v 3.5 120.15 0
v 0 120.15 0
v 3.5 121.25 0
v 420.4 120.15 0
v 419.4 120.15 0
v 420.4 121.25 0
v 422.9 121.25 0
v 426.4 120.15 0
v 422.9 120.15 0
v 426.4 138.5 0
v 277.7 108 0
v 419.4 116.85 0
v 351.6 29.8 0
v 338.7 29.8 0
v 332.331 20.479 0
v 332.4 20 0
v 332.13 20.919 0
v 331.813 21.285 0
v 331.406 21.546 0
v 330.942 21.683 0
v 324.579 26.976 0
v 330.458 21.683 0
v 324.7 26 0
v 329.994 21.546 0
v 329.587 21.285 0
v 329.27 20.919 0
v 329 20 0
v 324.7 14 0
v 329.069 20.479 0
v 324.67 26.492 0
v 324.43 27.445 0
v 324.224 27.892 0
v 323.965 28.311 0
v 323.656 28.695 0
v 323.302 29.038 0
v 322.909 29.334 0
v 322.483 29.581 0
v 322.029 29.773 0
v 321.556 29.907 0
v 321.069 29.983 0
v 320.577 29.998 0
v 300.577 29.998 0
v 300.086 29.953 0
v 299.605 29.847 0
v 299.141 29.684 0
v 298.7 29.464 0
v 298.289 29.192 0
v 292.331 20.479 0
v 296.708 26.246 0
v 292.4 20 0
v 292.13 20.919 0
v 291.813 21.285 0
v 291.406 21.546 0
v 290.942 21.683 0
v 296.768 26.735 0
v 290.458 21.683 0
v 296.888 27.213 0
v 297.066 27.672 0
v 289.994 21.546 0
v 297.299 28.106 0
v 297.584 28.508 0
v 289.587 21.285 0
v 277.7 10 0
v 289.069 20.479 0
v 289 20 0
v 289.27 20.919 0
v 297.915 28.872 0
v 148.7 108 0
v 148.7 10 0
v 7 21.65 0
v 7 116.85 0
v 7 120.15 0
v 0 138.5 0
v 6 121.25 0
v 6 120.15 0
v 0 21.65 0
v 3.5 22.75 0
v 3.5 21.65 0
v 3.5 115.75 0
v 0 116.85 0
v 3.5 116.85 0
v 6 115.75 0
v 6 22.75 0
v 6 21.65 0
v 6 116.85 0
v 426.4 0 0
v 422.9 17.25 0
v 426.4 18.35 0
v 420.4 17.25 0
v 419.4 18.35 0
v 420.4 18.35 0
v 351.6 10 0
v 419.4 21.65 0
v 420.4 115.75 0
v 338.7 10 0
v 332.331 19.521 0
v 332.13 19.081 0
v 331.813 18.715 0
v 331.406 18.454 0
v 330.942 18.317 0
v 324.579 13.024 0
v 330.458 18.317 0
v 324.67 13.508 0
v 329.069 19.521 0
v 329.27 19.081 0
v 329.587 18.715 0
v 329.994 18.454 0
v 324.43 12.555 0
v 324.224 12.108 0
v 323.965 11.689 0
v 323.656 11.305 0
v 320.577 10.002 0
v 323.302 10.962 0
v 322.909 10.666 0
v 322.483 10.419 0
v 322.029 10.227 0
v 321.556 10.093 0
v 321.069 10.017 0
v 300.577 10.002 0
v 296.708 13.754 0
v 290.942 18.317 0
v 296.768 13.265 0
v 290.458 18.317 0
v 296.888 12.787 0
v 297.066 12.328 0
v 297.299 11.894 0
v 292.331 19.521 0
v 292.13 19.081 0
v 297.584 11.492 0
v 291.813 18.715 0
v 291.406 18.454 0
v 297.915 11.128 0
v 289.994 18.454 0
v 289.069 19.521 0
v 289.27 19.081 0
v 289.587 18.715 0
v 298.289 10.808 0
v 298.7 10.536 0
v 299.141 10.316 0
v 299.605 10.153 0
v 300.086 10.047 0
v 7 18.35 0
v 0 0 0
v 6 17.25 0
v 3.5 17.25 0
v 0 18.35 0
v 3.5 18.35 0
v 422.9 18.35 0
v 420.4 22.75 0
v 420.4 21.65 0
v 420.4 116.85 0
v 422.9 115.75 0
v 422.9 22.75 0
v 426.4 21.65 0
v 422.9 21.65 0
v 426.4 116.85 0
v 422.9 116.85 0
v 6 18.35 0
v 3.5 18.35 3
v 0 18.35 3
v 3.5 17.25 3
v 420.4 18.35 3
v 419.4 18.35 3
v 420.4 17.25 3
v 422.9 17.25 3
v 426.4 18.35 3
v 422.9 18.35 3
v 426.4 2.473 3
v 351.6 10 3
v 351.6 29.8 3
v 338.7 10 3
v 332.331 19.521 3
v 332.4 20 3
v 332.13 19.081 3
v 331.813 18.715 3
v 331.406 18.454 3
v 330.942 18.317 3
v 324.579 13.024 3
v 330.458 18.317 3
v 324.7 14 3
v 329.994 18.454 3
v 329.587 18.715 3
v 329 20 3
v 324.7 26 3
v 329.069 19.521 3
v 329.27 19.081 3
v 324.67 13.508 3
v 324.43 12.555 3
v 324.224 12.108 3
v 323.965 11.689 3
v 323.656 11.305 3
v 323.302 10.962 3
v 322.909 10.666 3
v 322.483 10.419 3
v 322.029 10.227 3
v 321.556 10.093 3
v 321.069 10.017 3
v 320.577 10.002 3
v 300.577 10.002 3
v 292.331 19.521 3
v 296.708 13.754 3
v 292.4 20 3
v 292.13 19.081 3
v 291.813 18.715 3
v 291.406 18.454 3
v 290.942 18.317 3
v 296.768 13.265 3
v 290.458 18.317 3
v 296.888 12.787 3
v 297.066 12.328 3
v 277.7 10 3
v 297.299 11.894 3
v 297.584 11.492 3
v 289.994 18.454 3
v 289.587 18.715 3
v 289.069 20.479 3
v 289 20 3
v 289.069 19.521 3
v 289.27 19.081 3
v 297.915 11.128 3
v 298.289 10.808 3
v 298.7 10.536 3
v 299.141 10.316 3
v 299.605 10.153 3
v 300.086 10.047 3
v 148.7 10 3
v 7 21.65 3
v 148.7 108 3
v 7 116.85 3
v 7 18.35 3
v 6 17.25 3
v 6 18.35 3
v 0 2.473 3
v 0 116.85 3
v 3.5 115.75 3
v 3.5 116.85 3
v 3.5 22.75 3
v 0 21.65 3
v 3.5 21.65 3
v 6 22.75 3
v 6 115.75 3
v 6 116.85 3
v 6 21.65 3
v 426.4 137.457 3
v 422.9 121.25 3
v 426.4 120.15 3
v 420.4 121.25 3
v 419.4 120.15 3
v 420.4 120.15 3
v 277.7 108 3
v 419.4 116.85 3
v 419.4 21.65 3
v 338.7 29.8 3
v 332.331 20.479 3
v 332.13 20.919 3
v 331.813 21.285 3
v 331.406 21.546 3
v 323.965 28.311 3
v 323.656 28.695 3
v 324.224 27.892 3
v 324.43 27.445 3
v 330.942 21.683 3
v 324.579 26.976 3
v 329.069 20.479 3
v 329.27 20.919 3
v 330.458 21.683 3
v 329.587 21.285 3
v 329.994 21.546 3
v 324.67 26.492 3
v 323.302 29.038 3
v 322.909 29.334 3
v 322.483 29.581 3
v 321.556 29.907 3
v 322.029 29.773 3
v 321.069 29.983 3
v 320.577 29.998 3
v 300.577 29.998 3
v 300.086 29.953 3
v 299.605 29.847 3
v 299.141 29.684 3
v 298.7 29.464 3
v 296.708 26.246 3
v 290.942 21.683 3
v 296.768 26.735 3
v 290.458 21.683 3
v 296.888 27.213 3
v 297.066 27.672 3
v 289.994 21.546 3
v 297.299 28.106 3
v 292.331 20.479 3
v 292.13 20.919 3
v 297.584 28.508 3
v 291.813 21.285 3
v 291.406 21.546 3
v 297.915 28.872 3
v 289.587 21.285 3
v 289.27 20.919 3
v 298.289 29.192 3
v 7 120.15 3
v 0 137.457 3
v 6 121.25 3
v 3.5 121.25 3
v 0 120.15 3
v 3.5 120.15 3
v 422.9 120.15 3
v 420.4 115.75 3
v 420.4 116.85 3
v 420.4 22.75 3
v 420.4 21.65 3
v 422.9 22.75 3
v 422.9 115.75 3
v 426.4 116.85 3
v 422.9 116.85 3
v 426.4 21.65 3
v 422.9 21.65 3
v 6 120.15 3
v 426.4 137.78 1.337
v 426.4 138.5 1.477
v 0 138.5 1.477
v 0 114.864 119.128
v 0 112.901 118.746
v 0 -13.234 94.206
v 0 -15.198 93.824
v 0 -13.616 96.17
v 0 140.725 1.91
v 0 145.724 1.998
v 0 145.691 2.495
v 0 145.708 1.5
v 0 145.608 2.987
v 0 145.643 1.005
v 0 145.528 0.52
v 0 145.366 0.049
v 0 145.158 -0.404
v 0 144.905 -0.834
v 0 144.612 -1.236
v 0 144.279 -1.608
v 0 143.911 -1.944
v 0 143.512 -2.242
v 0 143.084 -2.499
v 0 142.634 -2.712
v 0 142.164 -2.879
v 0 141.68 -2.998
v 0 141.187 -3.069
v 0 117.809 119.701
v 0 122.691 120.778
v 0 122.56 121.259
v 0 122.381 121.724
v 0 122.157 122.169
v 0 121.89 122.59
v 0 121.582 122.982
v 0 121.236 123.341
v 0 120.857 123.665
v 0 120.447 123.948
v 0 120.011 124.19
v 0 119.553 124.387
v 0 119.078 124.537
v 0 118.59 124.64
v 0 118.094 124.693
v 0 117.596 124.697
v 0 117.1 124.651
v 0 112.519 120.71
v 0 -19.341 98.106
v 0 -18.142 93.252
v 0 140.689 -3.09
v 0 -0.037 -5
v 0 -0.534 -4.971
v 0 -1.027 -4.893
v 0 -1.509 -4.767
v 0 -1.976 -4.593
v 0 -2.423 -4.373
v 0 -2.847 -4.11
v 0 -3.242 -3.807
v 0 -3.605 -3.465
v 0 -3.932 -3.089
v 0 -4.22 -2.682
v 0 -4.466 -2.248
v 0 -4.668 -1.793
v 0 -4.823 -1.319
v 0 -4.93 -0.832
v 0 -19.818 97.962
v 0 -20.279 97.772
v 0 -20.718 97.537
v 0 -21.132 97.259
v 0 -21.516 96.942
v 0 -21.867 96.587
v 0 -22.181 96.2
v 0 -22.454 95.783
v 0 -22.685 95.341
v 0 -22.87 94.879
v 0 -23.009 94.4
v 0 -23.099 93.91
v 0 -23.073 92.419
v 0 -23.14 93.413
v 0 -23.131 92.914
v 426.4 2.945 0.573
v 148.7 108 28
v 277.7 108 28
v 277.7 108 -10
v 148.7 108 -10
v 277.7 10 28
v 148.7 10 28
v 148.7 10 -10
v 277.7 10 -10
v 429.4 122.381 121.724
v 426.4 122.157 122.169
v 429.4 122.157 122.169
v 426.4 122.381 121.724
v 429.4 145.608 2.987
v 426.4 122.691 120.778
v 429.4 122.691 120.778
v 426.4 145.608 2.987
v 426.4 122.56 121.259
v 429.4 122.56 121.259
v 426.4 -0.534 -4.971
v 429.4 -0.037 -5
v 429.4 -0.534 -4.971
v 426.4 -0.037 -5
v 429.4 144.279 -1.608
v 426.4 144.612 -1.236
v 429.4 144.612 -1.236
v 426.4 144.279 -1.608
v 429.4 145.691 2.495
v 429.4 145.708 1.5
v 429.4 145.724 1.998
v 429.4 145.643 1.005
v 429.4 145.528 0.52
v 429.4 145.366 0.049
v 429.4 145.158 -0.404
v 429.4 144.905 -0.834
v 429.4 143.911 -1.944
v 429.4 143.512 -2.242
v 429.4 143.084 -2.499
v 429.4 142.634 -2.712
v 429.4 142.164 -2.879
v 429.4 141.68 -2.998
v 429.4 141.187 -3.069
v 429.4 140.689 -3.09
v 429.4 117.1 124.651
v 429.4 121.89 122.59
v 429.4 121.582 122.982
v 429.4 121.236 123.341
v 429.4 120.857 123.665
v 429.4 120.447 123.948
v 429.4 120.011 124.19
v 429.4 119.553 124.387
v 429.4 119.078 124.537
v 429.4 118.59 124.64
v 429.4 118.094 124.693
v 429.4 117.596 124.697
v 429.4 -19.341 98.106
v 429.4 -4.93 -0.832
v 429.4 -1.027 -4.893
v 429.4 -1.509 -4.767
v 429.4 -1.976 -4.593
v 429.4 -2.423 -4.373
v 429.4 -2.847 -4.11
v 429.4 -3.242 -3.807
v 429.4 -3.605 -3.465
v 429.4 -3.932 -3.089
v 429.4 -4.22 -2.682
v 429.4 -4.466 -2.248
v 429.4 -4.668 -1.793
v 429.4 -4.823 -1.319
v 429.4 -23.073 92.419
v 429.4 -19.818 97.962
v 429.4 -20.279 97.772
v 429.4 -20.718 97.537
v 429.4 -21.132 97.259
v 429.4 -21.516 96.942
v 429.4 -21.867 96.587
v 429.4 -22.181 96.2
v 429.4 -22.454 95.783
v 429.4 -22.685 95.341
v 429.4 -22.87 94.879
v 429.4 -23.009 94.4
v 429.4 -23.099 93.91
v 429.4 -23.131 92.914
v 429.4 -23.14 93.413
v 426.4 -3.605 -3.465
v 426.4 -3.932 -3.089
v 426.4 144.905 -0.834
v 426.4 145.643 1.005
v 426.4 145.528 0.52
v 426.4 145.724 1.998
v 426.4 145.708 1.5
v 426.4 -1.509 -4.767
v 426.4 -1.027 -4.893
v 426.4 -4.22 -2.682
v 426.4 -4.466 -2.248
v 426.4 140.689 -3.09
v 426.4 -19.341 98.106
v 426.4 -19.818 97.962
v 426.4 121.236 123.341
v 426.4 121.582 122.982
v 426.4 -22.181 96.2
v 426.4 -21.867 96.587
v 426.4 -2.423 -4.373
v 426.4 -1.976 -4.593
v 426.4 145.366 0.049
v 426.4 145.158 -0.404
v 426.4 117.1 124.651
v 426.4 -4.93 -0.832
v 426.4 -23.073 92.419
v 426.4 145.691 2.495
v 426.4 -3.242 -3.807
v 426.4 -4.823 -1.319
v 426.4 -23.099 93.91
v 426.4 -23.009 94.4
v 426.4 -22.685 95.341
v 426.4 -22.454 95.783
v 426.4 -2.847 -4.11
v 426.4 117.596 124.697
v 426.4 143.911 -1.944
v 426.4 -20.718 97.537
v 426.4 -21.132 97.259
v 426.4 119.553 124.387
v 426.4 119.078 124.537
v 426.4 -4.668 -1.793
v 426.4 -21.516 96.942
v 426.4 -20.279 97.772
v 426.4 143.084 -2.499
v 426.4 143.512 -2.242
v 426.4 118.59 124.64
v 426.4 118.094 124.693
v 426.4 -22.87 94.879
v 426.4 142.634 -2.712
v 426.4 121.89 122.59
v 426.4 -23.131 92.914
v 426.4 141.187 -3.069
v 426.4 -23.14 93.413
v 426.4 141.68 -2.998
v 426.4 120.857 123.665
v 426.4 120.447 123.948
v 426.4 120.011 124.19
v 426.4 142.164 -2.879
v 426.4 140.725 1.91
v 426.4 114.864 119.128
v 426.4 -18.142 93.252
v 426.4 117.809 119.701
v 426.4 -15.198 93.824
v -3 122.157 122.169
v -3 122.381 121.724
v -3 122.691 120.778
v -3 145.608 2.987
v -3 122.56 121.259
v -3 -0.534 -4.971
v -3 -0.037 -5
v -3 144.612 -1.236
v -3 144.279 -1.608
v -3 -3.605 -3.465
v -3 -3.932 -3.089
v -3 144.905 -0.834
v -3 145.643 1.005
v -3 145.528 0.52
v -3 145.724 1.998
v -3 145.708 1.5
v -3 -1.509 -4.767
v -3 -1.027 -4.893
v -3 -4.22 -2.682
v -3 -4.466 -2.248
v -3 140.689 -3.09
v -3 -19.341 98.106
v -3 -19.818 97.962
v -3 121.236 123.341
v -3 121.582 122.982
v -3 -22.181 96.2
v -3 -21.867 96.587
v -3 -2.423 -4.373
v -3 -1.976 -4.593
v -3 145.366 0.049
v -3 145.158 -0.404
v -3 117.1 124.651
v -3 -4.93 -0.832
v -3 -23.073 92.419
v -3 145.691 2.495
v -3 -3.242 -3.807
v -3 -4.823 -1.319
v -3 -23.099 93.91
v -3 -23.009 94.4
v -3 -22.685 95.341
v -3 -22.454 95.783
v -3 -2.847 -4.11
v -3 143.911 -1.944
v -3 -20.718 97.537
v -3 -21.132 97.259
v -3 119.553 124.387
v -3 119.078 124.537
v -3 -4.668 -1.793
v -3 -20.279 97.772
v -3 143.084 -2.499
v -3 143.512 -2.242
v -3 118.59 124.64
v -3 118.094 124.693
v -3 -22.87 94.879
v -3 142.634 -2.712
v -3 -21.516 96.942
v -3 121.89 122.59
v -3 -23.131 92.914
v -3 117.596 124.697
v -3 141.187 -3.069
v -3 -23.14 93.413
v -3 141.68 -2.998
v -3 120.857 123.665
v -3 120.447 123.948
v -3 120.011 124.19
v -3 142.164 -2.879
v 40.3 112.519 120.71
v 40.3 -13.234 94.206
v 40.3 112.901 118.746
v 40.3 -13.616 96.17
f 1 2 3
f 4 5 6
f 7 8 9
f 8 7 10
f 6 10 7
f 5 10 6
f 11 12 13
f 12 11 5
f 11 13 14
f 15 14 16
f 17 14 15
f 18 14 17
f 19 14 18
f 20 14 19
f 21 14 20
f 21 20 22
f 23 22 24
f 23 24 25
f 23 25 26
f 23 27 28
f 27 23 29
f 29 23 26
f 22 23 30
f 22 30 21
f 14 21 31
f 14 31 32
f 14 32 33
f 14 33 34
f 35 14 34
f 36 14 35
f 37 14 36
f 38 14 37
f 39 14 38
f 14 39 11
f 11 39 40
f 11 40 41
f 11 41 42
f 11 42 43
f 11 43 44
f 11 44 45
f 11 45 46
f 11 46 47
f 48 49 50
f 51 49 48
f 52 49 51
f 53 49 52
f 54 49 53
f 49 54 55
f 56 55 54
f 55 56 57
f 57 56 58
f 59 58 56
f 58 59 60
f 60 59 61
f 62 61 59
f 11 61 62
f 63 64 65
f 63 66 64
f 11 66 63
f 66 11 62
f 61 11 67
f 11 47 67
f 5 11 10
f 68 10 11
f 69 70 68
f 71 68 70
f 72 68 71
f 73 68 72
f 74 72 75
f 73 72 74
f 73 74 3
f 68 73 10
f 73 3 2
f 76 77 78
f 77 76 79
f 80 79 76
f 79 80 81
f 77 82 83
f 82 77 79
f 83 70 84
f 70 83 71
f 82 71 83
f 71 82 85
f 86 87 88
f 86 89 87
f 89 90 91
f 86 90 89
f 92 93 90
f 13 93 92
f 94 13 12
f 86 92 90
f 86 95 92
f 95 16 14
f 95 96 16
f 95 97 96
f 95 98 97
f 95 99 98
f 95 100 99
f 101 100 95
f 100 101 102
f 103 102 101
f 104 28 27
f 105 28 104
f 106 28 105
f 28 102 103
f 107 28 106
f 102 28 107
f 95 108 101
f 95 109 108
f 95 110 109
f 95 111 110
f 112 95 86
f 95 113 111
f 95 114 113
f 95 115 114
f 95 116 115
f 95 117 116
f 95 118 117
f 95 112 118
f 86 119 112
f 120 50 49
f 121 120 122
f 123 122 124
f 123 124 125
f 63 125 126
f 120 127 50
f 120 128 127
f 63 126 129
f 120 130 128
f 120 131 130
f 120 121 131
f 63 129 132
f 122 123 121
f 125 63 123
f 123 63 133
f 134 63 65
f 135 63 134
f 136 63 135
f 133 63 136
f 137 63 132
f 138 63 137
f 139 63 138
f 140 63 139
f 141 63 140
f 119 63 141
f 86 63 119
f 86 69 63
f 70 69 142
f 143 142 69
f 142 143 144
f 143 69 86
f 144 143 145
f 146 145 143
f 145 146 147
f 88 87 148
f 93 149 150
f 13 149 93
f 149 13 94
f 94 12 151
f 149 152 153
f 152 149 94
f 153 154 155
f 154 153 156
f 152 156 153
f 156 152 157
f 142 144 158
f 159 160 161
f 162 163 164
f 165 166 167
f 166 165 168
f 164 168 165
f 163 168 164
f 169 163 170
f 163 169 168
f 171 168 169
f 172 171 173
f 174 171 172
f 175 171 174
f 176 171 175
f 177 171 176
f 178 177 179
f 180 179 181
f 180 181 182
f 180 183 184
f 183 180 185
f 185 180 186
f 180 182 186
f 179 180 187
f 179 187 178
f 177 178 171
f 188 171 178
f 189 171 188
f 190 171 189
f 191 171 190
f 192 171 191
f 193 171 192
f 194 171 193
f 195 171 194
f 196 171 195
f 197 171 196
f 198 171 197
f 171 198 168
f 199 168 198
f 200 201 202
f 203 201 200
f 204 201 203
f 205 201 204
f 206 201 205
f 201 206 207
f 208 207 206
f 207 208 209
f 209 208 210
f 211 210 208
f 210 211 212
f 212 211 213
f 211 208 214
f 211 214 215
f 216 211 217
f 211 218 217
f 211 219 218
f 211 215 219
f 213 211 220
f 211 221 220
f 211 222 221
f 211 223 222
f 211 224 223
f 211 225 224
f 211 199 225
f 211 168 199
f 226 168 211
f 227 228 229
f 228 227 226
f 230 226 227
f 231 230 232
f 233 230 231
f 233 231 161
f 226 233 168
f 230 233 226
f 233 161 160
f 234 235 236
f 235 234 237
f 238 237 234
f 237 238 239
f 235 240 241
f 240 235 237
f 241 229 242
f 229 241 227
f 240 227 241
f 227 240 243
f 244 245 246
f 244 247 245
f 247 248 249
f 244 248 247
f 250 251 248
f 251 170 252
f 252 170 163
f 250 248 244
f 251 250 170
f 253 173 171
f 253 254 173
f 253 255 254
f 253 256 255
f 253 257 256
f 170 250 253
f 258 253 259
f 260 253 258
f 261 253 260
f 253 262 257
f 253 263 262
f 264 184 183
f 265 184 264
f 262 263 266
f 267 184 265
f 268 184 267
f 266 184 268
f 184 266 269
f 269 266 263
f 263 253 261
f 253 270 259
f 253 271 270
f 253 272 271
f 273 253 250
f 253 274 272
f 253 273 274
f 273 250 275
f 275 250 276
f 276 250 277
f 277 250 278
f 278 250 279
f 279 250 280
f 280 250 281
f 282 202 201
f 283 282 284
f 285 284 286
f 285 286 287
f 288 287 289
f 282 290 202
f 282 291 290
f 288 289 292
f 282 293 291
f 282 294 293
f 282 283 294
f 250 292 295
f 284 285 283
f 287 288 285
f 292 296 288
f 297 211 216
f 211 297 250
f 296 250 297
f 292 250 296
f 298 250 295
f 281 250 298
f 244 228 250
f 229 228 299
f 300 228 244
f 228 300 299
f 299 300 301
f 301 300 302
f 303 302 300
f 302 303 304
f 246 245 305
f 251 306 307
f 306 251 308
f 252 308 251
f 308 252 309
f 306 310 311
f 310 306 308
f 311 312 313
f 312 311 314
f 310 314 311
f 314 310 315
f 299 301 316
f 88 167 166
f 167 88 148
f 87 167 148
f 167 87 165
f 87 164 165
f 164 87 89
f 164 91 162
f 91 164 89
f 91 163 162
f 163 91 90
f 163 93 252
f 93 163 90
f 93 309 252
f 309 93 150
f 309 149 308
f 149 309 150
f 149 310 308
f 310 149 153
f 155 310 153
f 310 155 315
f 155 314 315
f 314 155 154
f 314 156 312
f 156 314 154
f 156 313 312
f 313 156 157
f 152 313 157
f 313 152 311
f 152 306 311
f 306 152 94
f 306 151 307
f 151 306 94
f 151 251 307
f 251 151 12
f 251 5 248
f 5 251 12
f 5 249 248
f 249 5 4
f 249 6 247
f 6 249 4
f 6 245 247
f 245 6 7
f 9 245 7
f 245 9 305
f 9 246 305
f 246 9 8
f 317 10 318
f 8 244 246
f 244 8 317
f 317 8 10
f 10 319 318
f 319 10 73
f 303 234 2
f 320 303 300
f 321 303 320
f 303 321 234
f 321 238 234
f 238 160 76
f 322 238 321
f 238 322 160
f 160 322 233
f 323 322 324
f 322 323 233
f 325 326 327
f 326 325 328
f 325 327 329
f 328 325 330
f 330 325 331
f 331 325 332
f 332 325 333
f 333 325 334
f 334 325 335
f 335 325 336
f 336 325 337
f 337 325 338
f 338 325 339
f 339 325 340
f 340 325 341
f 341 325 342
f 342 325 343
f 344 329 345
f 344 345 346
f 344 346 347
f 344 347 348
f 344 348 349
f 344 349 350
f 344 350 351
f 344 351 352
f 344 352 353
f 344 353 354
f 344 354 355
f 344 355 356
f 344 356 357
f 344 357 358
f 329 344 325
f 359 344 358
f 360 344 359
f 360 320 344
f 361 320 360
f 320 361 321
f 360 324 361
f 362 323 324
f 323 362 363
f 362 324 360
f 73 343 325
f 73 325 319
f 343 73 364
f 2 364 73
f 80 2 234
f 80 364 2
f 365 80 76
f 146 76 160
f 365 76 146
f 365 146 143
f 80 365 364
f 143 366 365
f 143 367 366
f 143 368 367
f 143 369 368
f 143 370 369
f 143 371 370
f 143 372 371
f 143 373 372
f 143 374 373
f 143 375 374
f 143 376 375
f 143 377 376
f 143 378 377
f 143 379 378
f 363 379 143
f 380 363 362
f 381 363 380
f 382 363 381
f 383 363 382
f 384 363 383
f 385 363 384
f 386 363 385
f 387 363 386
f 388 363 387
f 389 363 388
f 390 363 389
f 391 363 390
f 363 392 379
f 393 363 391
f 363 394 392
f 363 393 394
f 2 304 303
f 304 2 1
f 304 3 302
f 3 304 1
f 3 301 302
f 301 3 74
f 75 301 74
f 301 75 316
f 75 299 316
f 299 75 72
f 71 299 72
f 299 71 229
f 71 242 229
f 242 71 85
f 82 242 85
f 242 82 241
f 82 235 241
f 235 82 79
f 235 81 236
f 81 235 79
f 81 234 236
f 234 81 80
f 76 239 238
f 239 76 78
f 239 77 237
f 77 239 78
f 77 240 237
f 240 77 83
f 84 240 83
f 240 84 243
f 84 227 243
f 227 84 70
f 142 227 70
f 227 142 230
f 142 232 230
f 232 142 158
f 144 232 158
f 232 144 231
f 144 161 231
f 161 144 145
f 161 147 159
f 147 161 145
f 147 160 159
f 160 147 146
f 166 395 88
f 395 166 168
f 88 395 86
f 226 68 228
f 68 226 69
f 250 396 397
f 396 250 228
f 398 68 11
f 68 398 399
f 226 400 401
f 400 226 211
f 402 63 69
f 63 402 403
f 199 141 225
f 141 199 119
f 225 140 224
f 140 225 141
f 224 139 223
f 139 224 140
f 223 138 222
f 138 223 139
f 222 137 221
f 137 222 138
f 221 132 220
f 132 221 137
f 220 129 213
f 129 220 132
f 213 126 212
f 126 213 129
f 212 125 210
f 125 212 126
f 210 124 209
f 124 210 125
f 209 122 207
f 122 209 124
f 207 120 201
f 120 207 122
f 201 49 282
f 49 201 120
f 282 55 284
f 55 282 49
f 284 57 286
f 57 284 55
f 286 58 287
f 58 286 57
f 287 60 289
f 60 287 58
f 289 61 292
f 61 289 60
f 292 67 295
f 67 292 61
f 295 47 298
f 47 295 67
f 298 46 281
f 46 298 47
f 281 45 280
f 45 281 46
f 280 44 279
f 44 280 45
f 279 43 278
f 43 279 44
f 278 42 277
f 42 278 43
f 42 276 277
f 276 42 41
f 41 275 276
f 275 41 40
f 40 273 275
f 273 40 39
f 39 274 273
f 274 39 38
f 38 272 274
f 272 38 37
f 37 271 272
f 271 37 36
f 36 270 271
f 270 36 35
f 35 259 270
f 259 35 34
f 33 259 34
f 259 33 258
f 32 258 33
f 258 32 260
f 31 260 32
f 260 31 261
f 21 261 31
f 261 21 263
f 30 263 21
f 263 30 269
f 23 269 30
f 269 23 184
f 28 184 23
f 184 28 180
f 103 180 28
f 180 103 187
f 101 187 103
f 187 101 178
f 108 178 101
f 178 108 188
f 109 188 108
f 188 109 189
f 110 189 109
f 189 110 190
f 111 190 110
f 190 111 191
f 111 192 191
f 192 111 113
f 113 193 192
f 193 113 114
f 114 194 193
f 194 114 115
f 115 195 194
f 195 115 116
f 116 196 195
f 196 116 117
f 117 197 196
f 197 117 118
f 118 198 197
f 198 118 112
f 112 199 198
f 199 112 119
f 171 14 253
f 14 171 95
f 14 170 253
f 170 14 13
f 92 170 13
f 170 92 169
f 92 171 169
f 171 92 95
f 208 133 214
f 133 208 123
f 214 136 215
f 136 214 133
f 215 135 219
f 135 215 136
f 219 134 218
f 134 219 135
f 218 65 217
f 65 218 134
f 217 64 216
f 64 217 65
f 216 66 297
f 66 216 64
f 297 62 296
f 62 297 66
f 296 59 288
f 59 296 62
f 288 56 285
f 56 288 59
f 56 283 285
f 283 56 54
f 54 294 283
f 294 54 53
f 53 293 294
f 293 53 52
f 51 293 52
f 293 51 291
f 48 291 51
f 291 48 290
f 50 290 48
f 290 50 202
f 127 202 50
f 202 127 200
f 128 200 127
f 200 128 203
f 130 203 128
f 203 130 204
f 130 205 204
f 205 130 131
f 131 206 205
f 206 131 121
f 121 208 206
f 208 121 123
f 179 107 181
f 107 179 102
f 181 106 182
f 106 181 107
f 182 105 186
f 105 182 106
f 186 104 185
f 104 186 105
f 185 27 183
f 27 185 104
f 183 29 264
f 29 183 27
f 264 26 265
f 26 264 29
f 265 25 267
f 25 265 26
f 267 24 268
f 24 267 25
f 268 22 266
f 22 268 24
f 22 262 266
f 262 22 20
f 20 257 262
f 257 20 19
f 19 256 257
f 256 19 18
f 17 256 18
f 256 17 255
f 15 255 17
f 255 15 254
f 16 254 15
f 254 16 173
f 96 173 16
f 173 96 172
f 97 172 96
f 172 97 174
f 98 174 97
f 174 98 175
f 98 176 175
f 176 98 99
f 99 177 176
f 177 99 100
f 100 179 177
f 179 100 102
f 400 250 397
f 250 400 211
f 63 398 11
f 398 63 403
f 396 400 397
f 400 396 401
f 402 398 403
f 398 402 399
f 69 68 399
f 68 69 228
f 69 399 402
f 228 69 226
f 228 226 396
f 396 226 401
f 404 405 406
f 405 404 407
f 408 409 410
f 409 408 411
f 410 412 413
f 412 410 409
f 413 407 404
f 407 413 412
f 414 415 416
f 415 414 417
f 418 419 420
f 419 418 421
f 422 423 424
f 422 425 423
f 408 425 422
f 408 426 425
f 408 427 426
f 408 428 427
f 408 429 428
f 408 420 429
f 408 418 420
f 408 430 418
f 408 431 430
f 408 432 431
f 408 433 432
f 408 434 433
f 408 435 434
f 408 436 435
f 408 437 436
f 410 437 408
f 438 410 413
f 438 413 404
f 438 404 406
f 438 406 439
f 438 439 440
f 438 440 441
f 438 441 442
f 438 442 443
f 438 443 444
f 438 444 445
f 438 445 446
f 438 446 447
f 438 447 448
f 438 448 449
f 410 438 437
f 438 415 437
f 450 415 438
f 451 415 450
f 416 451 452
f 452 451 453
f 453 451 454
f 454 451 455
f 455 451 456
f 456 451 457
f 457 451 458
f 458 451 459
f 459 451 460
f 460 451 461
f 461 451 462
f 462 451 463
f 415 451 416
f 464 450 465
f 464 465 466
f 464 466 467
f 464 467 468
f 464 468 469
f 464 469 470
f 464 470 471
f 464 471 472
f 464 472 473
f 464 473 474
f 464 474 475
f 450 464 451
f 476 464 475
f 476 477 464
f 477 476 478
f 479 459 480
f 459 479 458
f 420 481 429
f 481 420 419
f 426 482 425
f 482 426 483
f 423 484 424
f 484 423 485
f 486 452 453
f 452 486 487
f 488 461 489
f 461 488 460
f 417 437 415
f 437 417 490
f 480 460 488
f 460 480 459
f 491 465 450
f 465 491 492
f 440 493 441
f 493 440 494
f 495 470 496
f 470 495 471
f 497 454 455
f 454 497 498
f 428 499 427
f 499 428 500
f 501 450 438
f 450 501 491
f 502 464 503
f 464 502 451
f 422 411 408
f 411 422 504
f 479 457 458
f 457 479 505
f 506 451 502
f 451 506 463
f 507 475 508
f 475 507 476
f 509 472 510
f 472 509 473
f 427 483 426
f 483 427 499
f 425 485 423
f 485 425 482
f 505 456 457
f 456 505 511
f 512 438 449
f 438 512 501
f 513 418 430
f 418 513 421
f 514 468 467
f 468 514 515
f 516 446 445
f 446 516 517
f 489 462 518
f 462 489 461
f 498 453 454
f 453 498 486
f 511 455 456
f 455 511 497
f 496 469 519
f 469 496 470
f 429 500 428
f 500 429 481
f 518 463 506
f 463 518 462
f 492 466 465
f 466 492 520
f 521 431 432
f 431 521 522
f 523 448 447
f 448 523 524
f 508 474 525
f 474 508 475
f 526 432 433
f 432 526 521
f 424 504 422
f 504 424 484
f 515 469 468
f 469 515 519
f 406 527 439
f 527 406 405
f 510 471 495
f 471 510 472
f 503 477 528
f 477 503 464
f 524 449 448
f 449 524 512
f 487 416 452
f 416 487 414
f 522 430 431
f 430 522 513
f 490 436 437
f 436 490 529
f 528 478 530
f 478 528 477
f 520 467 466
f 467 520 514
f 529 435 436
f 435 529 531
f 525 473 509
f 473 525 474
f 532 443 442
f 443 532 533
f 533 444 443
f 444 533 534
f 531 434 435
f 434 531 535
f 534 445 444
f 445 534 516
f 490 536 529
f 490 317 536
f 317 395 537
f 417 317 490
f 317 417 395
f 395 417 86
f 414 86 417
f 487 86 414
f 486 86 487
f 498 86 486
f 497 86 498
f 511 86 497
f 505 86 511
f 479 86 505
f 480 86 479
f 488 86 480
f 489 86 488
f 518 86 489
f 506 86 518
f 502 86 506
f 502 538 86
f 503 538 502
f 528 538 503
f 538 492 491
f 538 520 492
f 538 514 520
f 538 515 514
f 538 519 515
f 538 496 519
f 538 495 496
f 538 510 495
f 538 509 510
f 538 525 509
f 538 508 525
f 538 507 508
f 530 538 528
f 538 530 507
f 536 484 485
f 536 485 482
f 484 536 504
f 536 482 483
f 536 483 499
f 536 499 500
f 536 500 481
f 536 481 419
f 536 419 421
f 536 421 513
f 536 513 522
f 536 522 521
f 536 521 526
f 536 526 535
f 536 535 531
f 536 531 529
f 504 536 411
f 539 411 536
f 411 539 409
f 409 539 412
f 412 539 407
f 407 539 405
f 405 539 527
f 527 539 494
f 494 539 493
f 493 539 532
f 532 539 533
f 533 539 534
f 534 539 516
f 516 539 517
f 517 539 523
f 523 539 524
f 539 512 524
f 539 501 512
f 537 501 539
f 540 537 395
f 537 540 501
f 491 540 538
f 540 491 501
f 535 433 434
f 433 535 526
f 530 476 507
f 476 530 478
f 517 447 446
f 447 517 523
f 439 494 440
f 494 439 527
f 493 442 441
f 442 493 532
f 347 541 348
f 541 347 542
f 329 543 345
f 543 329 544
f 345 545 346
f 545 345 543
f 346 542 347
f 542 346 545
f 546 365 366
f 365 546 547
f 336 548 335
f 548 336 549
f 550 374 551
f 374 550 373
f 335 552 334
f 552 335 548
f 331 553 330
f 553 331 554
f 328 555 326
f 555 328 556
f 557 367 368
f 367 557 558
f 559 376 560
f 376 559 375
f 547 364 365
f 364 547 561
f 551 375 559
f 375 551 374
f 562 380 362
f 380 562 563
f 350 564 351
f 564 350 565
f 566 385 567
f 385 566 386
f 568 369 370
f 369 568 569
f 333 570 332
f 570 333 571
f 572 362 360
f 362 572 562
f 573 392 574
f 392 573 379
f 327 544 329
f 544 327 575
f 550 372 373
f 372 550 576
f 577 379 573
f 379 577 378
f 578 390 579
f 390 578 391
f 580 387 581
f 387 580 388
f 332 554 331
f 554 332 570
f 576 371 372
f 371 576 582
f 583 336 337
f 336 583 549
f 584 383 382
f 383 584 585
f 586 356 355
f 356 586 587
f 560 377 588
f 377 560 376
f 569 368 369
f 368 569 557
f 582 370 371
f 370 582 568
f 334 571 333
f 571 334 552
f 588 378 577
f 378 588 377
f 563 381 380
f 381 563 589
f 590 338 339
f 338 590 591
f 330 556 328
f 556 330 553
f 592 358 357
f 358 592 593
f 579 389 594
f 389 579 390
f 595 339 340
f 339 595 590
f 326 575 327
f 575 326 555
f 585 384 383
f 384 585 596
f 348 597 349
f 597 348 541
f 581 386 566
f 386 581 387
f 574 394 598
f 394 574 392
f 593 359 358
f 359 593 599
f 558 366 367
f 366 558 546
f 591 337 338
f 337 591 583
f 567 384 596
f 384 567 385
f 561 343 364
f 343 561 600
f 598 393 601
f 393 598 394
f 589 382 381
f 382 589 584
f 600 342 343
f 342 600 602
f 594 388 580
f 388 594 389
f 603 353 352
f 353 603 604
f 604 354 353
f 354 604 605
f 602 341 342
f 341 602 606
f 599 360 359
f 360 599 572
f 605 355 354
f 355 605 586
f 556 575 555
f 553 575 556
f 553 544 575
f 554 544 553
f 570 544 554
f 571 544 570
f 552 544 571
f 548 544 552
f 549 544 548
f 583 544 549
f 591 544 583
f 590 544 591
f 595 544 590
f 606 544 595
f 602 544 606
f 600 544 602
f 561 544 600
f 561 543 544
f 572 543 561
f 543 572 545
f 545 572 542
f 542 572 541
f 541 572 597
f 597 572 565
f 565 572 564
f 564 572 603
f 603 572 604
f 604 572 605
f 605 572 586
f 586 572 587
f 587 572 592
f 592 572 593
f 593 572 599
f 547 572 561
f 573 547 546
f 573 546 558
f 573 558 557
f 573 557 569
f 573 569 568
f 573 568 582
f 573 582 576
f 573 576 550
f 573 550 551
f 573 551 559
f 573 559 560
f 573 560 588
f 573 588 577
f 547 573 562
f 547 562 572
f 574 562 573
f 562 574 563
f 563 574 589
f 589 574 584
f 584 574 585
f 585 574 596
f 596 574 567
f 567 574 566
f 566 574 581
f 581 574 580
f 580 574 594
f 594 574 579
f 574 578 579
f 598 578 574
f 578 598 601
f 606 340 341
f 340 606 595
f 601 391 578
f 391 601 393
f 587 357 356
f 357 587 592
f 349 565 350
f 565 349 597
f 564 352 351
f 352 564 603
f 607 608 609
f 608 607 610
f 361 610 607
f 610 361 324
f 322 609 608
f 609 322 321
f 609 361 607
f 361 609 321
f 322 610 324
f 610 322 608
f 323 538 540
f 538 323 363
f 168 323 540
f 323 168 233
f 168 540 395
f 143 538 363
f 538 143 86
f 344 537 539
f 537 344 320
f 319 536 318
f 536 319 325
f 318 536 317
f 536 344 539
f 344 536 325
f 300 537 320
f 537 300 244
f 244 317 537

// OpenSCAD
// file: zrail.scad
module zrail(length) {
  translate([-14.285, -5.045])
  linear_extrude(height=length)
    import("z-rails.dxf"); 
}
// main file
use <zrail.scad>;


// Eurorack standards:
face_height = 128.5;
space_between_rails = 122.5;

z_rail_length = 426.4;
zrail_lip = 5;
zrail_inset_from_face = 15;

power_supply = [129, 98, 38];


enclosure_depth = 120;

// how much the bottom gets pulled in. This creates the angle.
side_bottom_inset = 25;

m3_hole_size = 3.3;
m3_nut = [2.5, 5.5];

material_width = 3;

tnut_inset_from_edge = 20;

front_spacing = face_height + zrail_lip * 2;

back_size = [z_rail_length, front_spacing];
side_size = [enclosure_depth, front_spacing];

power_supply_pos = [(back_size.x - power_supply.x)/2, 10];

angle = atan(side_bottom_inset/face_height);


*back(back_size);
mockup();
*side();

$fa = 0.5;
$fs = 0.5;
smidge = 0.01;


module mockup() {
  rotate([angle, 0, 0]) {
    rotate([-angle, 0, 0]) {
      linear_extrude(height=material_width)
        back(back_size);
      color("#aaa")
        translate([0, 0, -10])
        translate(power_supply_pos)
          cube(power_supply);

    }

    color("green")
    translate([0, zrail_lip, enclosure_depth - side_bottom_inset])
      module_faceplate();

    color("#ccc")
      translate([0, zrail_lip + material_width, 0]) {
        translate([0, space_between_rails, enclosure_depth - side_bottom_inset - zrail_inset_from_face])
          rotate([90, 90, 90])
            zrail(back_size.x);

      translate([0, 0, enclosure_depth - side_bottom_inset - zrail_inset_from_face])
        mirror([0, 1, 0])
          rotate([90, 90, 90])
            zrail(back_size.x);
      }

    cube([back_size.x, material_width, enclosure_depth - side_bottom_inset]);
    translate([0, back_size.y - material_width, -side_bottom_inset])
      cube([back_size.x, material_width, enclosure_depth]);

    // sides
    translate([0, 0, side_size.x - side_bottom_inset]) {
      translate([back_size.x, 0, 0])
        rotate([0, 90, 0])
          linear_extrude(height=material_width)
            side(side_size, side_bottom_inset);
      translate([-material_width, 0, 0])
        rotate([0, 90, 0])
          linear_extrude(height=material_width)
            side(side_size, side_bottom_inset);
      }
  }
}

module m3_tnut(length) {
  tnut([length, m3_hole_size], m3_nut);
}

module tnut(size, nut, extra=1) {
  translate([0, -size.y/2]) {
    square(size);
    translate([size.x - extra - nut.x, -(nut.y - size.y) / 2])
      square(nut);
  }
}

module back(size) {
  difference() {
    square(size);
    tnut_screw_length = 10;
    tnut_hole = tnut_screw_length - material_width;

    translate([-smidge, tnut_inset_from_edge])
      m3_tnut(tnut_hole + smidge);
    translate([-smidge, size.y - tnut_inset_from_edge])
      m3_tnut(tnut_hole + smidge);
    translate([size.x + smidge, tnut_inset_from_edge])
      rotate([0, 0, 180])
        m3_tnut(tnut_hole + smidge);
    translate([size.x + smidge, size.y - tnut_inset_from_edge])
      rotate([0, 0, 180])
        m3_tnut(tnut_hole + smidge);

    translate(power_supply_pos + [power_supply.x + 10, 0])
      power_plug_holes();

    translate(power_supply_pos)
      square([power_supply.x, power_supply.y]);
  }
}

module power_plug_holes() {
  plug_hole = [28, 20];
  screw_offset = 6;
  switch_offset = 8;

  translate([screw_offset + 3, 0]) {
    rounded_square(plug_hole, 4);
    translate([-screw_offset, plug_hole.y/2])
      circle(r=1.7);
    translate([plug_hole.x + screw_offset, plug_hole.y/2])
      circle(r=1.7);

    switch_hole = [12.9, 19.8];

    translate([plug_hole.x + screw_offset + switch_offset, 0])
      square(switch_hole);
  }
}

module side(size, back_slope) {
  minkowski() {
    polygon([[0, 0], [size.x - back_slope, 0], [size.x, size.y], [0, size.y]]);
    circle(r=5);
  }
}

module module_faceplate() {
  cube([40.3, face_height, 2]);
}

module rounded_square(size, radius) {
  translate([radius, radius])
    minkowski() {
      circle(r=radius);
      square(size - [radius*2, radius*2]);
    }
}
